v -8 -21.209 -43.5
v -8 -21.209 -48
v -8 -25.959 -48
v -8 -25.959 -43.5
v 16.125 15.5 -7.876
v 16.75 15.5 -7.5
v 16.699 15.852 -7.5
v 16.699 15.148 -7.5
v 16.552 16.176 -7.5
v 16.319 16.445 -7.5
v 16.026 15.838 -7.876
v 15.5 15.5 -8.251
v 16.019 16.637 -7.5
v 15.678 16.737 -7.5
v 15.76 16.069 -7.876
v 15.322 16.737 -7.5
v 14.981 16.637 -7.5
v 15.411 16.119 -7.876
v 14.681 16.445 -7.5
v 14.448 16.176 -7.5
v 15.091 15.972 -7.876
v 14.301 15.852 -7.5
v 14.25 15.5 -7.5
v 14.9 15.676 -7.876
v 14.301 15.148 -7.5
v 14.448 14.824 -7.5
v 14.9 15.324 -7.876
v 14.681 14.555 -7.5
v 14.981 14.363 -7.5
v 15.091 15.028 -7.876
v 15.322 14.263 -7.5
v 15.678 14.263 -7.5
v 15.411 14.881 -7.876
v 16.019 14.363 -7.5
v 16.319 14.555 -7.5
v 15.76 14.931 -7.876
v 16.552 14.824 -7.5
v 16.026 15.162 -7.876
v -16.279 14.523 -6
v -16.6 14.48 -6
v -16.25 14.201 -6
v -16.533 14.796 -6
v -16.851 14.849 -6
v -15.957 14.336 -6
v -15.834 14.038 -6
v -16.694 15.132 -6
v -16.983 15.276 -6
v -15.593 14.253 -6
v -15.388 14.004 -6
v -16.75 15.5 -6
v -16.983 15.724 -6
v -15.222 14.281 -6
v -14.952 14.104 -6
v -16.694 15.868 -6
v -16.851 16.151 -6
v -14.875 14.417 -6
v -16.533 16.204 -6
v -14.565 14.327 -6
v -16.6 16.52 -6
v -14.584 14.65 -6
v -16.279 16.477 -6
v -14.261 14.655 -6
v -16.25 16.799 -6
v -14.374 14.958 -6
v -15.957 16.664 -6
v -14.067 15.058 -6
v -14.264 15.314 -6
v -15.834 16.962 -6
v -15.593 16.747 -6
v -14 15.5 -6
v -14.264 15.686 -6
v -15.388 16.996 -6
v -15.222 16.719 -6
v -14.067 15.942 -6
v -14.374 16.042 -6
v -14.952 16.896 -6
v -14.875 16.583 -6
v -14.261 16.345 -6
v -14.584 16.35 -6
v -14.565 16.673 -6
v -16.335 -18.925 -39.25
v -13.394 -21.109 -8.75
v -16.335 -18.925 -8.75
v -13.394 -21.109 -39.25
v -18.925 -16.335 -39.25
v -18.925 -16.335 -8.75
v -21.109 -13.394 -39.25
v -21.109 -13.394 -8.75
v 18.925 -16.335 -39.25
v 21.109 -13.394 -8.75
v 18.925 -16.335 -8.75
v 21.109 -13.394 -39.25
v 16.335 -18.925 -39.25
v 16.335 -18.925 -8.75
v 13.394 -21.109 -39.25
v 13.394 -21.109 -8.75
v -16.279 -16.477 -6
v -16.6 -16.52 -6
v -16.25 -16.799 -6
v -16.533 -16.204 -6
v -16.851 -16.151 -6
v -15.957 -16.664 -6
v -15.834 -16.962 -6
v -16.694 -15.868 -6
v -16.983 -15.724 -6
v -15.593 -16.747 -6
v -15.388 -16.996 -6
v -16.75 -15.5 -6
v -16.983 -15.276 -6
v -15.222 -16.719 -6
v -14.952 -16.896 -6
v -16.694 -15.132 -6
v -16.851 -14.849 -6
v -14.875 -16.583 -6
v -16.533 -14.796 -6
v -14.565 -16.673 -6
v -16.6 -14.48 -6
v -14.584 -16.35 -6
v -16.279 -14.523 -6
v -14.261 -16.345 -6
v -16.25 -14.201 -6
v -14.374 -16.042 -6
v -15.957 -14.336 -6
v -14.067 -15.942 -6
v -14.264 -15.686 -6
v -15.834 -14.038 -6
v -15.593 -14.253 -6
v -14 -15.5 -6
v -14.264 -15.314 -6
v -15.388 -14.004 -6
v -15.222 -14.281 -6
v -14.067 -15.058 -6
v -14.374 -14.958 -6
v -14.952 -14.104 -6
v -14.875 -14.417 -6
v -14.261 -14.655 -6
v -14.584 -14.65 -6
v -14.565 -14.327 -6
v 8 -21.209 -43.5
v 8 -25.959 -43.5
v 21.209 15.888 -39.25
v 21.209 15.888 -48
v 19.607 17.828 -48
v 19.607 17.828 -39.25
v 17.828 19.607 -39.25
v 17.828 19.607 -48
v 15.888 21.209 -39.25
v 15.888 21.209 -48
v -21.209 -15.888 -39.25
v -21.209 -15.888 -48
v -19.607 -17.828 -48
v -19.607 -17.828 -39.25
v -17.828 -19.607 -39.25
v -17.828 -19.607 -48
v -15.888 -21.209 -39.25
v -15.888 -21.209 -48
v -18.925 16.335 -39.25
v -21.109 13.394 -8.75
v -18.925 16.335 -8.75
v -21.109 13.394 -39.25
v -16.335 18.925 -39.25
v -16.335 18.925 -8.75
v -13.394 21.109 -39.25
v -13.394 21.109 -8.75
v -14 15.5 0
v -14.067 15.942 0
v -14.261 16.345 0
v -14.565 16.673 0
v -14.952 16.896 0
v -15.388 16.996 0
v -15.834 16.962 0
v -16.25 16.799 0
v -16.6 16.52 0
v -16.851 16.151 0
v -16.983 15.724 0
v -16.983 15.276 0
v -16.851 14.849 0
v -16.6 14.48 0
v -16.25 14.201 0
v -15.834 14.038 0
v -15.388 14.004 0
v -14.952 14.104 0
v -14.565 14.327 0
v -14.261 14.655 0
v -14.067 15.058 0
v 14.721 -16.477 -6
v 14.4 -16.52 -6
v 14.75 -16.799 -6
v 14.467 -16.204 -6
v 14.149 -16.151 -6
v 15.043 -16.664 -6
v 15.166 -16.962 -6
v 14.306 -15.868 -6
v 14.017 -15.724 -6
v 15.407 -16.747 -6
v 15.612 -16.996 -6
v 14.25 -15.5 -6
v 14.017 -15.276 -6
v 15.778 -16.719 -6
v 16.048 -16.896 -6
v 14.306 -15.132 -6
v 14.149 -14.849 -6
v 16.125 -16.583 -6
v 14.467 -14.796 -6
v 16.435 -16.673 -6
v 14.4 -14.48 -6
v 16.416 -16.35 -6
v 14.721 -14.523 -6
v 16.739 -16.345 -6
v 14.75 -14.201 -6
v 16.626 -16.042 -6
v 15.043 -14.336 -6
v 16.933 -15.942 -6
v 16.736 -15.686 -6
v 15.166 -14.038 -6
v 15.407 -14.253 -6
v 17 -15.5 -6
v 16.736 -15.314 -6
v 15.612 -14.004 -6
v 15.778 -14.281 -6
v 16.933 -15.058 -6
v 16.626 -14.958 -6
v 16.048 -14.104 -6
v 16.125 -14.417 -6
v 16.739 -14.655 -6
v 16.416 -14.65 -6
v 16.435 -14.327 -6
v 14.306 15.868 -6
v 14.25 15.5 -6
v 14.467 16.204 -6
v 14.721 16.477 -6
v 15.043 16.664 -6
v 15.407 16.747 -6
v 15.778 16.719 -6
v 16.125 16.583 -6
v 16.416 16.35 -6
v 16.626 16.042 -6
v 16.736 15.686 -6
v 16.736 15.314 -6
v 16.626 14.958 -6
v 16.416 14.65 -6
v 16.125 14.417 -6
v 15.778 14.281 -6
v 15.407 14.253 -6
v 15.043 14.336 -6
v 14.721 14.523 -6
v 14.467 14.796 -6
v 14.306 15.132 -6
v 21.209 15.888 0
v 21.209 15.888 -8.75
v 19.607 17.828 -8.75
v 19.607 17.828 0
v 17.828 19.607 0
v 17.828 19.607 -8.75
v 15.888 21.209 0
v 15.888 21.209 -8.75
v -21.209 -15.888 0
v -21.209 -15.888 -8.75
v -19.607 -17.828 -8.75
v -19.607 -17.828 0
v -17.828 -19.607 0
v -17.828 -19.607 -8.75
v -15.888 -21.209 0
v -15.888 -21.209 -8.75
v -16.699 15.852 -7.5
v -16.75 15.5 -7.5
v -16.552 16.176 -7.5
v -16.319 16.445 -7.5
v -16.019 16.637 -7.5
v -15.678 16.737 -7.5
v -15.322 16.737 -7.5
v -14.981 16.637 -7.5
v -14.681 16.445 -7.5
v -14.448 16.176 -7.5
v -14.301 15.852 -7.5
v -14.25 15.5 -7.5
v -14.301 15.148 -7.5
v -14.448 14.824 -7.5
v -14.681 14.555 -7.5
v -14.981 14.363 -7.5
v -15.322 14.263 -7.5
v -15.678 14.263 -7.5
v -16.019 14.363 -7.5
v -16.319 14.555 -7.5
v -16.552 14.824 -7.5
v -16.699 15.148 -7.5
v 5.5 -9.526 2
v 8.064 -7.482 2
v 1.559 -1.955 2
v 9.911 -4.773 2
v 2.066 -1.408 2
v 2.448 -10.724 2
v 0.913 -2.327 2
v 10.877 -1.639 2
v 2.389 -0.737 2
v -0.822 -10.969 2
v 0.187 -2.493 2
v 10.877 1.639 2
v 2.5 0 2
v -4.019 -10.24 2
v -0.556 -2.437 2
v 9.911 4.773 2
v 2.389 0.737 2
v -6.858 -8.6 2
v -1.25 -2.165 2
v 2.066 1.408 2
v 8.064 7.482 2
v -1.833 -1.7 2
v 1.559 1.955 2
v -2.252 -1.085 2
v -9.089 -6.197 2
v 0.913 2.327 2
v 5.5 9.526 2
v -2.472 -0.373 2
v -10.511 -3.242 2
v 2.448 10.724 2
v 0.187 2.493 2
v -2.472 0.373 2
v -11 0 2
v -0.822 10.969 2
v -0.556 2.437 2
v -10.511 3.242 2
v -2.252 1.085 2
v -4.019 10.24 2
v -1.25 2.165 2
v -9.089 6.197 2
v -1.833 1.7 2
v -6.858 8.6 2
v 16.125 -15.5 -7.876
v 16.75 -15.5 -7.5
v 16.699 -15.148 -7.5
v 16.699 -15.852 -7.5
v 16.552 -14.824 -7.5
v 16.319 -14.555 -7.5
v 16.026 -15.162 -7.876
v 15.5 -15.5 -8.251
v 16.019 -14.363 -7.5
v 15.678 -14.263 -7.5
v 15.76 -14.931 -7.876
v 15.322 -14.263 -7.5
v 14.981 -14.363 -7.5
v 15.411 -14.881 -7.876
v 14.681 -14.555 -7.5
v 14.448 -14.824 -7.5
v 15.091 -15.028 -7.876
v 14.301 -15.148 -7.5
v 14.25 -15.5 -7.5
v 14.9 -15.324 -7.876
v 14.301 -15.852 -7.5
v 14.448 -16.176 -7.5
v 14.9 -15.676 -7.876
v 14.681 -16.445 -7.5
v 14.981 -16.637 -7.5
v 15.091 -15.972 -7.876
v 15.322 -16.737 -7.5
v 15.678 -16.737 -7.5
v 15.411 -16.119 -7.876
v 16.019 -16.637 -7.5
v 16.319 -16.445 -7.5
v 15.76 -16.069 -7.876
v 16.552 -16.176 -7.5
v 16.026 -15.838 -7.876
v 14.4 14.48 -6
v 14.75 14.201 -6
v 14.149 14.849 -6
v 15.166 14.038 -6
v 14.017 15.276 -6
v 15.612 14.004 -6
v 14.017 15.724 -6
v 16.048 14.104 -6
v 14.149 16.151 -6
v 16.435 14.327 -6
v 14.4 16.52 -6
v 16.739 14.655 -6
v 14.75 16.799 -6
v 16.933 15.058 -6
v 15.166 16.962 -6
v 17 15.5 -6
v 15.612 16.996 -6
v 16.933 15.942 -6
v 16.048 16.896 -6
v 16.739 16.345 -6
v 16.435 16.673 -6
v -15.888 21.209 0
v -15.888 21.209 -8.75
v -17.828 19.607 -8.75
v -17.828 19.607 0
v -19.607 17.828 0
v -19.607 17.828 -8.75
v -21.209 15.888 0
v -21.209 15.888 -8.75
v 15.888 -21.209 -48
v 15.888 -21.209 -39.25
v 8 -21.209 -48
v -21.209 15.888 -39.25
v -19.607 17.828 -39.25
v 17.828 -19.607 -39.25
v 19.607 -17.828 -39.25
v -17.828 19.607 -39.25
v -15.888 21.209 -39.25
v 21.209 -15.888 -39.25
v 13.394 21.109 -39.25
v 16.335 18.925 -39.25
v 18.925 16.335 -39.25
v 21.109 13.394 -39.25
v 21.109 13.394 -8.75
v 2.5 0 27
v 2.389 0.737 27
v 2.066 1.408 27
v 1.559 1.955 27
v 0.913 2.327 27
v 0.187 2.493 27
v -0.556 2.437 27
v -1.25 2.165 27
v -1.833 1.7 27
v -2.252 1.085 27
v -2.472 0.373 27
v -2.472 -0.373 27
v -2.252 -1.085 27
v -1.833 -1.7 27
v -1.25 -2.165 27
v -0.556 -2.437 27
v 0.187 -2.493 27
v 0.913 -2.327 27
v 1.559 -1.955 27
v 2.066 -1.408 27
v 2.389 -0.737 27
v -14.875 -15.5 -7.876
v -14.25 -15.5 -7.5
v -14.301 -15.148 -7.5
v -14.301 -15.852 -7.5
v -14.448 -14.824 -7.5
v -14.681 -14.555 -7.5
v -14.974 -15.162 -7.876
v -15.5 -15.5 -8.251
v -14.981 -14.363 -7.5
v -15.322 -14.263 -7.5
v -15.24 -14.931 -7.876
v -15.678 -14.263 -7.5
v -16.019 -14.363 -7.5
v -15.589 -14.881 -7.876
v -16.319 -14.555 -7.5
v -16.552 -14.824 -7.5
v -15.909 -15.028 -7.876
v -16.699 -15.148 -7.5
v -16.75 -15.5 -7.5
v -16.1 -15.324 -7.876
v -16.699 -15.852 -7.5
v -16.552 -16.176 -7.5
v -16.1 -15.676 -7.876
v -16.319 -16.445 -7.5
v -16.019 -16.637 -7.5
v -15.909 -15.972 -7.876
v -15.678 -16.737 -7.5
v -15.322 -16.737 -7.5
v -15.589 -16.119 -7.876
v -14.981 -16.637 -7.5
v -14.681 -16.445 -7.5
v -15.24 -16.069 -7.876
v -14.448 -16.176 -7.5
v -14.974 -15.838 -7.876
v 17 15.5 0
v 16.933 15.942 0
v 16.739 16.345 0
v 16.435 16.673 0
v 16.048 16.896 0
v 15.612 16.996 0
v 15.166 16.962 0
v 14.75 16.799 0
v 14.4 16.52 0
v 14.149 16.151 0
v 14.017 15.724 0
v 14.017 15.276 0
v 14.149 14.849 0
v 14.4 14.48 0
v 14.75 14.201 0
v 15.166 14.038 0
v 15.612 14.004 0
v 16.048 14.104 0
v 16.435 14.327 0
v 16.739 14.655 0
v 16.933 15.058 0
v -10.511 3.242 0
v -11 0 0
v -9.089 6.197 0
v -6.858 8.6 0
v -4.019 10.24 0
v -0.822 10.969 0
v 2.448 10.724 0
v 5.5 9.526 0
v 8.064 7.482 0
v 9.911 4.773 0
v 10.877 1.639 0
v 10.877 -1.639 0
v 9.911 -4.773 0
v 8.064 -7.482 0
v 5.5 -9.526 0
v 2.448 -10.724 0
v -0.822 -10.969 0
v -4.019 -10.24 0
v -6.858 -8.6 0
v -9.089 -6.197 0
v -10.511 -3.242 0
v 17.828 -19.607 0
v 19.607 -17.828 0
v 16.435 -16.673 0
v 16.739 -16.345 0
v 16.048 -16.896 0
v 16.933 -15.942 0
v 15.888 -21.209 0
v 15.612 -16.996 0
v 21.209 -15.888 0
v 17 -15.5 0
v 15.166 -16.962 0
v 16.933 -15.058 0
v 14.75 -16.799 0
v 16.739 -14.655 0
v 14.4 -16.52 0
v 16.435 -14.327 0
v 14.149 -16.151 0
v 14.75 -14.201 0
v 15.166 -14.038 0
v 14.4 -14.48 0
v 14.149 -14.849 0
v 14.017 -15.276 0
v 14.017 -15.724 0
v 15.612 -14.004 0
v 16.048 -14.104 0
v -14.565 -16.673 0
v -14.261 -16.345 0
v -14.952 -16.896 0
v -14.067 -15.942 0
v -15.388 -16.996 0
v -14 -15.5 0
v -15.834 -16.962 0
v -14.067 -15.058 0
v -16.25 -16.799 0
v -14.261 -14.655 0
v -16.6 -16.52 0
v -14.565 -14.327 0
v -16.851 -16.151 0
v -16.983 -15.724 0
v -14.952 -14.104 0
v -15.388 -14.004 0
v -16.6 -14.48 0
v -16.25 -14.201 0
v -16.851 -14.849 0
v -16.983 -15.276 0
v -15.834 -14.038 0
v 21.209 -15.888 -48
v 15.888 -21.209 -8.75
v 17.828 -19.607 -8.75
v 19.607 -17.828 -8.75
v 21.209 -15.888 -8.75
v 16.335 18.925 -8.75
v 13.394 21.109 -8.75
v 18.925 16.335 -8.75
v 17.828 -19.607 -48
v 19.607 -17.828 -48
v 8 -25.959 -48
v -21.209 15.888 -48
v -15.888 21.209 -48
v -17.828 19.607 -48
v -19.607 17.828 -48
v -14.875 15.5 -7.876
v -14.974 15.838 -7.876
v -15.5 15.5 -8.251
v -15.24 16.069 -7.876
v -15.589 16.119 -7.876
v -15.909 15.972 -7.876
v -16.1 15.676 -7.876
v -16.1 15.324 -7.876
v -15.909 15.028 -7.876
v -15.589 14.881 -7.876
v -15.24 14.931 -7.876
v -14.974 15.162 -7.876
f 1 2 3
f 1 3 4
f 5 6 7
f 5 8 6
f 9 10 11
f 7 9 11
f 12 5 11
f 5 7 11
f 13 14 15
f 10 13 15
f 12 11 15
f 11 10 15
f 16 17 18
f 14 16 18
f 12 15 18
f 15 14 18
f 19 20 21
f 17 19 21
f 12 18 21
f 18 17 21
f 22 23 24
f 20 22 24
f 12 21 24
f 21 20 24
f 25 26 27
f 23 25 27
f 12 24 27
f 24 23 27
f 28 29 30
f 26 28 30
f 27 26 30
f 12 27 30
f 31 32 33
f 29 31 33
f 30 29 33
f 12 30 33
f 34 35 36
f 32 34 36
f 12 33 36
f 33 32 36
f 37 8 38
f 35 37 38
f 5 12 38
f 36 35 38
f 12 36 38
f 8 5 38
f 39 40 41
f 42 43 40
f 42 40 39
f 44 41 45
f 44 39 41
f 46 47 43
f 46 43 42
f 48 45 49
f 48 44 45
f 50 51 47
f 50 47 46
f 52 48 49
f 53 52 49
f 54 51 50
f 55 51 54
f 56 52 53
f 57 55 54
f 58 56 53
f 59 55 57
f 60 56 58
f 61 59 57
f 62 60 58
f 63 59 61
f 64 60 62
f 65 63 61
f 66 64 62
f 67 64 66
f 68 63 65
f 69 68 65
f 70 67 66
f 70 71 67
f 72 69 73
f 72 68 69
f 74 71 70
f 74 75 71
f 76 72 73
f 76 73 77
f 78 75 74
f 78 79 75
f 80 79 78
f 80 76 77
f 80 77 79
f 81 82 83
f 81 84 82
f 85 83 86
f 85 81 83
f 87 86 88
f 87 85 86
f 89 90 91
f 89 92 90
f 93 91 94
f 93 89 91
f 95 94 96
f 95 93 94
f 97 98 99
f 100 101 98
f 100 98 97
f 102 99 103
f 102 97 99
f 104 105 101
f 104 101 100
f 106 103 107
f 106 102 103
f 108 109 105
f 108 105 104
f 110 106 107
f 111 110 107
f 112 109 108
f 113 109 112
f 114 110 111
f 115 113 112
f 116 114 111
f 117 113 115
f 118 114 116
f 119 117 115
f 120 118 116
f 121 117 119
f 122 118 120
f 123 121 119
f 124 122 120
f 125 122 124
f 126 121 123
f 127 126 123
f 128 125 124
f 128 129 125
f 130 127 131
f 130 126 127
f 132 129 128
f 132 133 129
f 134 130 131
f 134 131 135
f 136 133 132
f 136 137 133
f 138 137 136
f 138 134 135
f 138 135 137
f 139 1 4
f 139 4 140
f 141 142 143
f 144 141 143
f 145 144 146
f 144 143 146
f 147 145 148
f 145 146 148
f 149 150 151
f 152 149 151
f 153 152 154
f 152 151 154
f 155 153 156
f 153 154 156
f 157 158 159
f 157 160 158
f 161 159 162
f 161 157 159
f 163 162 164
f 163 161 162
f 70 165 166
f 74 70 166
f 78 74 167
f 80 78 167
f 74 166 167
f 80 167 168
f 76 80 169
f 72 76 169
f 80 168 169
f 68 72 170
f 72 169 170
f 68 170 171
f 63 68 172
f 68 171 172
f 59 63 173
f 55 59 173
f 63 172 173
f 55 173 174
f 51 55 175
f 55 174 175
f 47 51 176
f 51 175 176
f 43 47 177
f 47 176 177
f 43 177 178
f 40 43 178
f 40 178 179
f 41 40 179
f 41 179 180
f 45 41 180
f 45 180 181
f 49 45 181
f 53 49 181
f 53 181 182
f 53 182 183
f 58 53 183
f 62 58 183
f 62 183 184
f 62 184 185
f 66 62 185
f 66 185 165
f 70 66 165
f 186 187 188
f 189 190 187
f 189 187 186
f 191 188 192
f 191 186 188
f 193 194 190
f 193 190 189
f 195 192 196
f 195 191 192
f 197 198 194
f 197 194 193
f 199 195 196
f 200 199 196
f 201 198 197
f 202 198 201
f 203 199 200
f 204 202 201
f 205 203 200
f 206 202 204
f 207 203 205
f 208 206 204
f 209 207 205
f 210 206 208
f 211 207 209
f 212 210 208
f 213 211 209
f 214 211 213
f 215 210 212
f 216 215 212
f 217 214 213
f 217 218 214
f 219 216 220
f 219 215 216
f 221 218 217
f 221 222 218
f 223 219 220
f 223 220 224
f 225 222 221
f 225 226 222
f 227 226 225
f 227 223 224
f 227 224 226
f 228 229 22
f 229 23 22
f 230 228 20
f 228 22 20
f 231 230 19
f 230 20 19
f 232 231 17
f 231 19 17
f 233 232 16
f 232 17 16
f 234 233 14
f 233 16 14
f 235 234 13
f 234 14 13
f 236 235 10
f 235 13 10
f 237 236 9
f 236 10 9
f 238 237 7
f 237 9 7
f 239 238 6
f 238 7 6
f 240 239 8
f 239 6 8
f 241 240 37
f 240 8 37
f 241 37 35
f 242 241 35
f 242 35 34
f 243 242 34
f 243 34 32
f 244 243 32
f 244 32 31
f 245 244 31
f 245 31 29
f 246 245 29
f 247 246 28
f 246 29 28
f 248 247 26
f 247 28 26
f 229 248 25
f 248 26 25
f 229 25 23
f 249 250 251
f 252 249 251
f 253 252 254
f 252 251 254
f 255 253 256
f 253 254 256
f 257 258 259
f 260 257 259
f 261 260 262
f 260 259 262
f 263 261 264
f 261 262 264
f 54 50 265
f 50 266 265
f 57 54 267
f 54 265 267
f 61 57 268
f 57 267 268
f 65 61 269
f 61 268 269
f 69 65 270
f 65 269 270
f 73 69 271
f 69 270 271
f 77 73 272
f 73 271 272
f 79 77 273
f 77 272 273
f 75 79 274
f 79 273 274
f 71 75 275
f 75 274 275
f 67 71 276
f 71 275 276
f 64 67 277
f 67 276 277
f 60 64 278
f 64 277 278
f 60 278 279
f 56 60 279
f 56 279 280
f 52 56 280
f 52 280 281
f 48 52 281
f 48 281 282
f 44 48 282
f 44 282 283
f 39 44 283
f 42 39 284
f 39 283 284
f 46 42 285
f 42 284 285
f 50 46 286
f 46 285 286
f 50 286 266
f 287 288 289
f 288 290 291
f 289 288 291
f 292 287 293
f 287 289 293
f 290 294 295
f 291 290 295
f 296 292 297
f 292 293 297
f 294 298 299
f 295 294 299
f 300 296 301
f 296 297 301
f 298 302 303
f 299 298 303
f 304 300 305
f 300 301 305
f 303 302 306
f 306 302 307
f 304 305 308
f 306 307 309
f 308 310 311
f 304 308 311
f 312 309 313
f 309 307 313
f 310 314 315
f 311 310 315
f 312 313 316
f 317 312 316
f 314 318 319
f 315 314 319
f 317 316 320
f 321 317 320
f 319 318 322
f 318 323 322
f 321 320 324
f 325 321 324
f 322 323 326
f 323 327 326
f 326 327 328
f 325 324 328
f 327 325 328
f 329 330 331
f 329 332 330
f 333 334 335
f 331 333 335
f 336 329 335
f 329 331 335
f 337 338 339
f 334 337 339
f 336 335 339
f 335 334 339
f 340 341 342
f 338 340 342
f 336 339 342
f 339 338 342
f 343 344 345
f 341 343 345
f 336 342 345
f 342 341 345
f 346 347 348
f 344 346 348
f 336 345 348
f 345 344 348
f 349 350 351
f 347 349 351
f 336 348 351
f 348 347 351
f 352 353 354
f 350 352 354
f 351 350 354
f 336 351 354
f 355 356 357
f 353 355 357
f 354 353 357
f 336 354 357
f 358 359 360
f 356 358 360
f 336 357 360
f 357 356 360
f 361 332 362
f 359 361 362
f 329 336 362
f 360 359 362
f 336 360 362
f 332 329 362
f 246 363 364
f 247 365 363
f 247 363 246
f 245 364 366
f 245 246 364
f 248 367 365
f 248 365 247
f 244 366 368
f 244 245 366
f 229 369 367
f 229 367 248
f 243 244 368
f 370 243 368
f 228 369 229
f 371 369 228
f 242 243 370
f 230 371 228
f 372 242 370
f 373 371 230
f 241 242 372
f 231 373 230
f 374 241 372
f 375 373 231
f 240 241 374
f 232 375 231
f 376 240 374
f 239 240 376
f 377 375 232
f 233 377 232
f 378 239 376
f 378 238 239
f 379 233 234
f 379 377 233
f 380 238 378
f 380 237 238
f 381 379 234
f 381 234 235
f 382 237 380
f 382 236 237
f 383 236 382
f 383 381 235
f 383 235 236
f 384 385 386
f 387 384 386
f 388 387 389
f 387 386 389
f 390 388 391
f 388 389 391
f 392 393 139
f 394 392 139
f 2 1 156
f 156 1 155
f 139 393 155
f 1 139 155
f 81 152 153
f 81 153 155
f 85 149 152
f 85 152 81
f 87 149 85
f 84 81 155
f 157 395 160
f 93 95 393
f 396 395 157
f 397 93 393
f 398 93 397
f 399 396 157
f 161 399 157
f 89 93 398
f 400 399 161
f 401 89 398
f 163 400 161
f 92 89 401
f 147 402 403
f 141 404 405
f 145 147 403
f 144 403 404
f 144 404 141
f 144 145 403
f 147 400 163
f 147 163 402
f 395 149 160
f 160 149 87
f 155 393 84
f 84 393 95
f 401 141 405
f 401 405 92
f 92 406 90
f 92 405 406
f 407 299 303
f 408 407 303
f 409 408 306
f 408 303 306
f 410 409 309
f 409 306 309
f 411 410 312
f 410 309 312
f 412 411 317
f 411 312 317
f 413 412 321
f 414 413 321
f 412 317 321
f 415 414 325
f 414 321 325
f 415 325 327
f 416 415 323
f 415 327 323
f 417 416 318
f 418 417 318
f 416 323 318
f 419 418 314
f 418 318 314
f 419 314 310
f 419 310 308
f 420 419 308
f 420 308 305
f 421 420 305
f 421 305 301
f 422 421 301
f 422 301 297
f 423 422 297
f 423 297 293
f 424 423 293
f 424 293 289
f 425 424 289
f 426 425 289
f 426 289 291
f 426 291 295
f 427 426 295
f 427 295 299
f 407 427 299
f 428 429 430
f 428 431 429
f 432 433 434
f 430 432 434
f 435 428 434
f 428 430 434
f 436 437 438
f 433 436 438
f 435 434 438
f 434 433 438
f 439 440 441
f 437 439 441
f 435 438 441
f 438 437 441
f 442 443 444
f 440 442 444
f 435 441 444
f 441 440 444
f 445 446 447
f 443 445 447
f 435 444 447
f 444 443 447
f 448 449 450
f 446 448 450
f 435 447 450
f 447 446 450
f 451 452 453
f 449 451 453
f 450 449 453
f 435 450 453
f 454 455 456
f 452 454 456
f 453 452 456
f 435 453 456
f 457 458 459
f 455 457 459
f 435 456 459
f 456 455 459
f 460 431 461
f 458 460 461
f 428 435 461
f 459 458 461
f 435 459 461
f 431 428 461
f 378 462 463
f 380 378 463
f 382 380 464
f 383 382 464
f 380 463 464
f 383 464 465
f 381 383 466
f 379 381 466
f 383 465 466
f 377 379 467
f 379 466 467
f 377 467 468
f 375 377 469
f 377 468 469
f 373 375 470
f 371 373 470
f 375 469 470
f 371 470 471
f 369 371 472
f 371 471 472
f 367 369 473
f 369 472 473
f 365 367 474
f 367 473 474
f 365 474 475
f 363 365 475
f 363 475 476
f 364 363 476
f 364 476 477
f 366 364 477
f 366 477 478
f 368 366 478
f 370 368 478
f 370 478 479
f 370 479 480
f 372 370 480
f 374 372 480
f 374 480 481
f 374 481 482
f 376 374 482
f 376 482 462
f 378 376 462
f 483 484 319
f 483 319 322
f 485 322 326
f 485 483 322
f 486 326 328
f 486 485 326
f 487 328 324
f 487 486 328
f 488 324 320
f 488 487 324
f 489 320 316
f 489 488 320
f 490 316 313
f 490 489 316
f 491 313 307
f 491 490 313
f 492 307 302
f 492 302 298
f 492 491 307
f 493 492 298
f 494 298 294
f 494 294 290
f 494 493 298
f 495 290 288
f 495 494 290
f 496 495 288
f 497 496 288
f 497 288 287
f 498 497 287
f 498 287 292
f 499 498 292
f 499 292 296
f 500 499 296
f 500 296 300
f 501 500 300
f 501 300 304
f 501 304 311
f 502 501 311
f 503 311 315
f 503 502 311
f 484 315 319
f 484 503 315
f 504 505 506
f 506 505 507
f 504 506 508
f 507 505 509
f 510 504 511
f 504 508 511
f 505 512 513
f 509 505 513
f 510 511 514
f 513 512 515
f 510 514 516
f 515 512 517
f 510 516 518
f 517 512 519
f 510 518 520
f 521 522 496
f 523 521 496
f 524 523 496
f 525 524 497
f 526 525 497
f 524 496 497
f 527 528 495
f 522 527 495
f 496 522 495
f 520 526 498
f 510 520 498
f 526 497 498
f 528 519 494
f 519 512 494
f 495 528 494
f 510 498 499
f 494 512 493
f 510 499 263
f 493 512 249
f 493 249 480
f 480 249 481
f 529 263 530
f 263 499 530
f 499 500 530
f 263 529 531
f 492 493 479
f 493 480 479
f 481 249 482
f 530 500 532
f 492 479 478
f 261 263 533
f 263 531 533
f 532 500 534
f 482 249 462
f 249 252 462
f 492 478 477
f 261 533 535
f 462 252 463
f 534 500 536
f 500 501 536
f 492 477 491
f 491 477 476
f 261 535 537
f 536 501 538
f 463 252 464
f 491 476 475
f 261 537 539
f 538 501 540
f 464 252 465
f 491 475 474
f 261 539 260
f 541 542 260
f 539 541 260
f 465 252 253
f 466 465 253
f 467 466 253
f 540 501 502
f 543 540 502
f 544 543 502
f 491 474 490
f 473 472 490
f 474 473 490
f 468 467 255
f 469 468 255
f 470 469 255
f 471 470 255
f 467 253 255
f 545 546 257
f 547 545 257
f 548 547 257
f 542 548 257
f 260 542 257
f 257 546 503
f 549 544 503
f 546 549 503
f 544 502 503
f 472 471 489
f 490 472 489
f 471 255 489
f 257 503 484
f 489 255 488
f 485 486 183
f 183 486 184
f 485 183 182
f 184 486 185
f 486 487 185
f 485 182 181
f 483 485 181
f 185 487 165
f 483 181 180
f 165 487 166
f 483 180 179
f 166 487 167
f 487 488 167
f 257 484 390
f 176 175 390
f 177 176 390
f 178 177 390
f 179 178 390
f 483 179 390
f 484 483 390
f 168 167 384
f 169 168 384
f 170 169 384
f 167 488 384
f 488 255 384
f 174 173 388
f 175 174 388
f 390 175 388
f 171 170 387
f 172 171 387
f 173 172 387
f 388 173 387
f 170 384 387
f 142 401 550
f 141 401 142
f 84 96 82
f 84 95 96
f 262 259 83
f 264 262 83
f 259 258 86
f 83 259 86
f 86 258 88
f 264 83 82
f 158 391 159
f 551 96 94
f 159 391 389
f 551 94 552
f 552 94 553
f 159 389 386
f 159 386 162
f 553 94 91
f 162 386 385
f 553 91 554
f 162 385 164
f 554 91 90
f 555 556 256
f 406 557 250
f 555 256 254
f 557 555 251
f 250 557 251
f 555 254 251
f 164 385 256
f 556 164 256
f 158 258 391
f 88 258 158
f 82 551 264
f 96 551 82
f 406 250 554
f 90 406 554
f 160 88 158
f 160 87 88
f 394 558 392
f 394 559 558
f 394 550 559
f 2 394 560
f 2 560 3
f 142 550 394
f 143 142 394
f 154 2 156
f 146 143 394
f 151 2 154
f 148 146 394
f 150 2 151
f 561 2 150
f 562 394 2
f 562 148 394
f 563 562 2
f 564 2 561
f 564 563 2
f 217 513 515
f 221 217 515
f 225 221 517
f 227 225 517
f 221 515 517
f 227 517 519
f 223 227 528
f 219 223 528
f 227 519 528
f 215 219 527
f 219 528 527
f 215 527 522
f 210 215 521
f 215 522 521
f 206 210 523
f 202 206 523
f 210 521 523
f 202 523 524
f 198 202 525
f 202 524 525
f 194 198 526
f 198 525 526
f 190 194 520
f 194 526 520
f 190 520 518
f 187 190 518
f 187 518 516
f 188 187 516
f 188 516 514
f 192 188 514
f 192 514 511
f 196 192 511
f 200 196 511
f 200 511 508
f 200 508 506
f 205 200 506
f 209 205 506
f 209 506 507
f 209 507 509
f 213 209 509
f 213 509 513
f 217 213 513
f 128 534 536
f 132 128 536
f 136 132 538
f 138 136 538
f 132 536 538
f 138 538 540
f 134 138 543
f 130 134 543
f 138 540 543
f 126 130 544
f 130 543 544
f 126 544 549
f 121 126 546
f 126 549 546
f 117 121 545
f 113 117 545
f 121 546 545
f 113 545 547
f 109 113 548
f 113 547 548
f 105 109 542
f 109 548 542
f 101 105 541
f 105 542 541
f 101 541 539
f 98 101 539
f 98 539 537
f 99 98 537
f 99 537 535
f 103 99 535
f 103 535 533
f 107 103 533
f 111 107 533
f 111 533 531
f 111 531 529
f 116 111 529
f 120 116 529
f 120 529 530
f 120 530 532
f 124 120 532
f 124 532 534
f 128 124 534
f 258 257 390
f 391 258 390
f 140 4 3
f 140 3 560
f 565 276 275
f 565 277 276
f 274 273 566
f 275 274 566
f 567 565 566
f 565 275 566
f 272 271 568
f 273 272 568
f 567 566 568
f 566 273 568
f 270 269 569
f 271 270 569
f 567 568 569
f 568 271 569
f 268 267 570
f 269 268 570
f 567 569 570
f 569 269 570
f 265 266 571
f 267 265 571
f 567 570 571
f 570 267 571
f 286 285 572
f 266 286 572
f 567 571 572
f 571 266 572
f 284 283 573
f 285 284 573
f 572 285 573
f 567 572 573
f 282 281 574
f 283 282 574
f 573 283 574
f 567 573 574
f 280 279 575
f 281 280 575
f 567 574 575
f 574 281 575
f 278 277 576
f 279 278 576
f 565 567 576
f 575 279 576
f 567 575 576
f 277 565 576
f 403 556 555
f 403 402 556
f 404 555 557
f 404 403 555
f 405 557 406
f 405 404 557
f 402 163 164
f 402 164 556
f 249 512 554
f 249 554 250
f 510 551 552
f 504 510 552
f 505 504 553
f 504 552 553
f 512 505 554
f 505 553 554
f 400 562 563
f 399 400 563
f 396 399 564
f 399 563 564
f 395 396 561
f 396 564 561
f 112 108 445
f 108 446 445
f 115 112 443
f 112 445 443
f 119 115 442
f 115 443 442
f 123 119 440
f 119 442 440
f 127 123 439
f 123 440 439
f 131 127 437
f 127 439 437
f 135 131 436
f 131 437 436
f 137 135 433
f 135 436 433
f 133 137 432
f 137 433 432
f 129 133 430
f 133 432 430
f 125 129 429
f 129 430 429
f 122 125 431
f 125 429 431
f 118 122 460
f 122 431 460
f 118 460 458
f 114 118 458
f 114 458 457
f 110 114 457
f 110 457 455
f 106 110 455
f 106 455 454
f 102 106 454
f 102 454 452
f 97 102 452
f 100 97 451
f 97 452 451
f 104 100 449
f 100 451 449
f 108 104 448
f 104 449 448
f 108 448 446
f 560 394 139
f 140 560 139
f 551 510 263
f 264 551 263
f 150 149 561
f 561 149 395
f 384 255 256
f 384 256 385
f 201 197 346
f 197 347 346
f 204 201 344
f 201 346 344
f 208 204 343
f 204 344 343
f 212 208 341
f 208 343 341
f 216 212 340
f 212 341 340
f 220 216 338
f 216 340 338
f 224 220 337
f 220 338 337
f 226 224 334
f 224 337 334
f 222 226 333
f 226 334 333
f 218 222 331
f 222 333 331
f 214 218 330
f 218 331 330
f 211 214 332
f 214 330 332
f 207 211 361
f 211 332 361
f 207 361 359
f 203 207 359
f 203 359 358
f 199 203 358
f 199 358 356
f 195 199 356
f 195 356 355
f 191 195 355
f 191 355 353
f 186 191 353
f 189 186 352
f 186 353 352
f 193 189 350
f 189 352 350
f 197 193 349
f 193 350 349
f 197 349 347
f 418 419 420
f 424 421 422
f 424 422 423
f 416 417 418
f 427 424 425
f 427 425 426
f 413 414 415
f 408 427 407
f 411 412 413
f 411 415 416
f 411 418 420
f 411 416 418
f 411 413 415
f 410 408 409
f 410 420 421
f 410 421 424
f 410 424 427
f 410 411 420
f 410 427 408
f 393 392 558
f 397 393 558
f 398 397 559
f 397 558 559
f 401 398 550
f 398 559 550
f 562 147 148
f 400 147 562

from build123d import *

# Parameters (mm, degrees)
SKETCH1_R                       = 2.5
BOSS_EXTRUDE1_DEPTH             = 27
SKETCH2_R                       = 11
BOSS_EXTRUDE2_DEPTH             = 2
SKETCH3_W                       = 42.418
SKETCH3_H                       = 42.418
BOSS_EXTRUDE3_DEPTH             = 48
CUT_EXTRUDE1_DEPTH              = 76
M3X0_5_TAPPED_HOLE1_D           = 2.5
M3X0_5_TAPPED_HOLE1_DEPTH       = 7.5
M3X0_5_TAPPED_HOLE1_CBORE_D     = 3
M3X0_5_TAPPED_HOLE1_CBORE_DEPTH = 6
M3X0_5_TAPPED_HOLE1_TIP         = 0.751075774
CUT_EXTRUDE3_DEPTH              = 15.25
CUT_EXTRUDE3_DEPTH_BACK         = 15.25
SKETCH9_W                       = 16
SKETCH9_H                       = 4.5
BOSS_EXTRUDE4_DEPTH             = 4.75


with BuildPart() as part:
    # Sketch1 → Boss-Extrude1 (new body)
    with BuildSketch(Plane.XY):
        Circle(SKETCH1_R)
    extrude(amount=BOSS_EXTRUDE1_DEPTH)

    # Sketch2 → Boss-Extrude2 (add)
    with BuildSketch(Plane(origin=(0, 0, 0), x_dir=(-1, 0, 0), z_dir=(0, 0, -1))):
        Circle(SKETCH2_R)
    extrude(amount=-BOSS_EXTRUDE2_DEPTH)

    # Sketch3 → Boss-Extrude3 (add)
    with BuildSketch(Plane(origin=(0, 0, 0), x_dir=(-1, 0, 0), z_dir=(0, 0, -1))):
        Rectangle(SKETCH3_W, SKETCH3_H)
    extrude(amount=BOSS_EXTRUDE3_DEPTH)

    # Sketch4 → Cut-Extrude1 (cut, through all)
    with BuildSketch(Plane(origin=(0, 0, -48), x_dir=(-1, 0, 0), z_dir=(0, 0, -1))):
        with BuildLine():
            Line((-21.209, -15.887992919), (-21.209, -21.209))
            Line((-21.209, -21.209), (-15.887992919, -21.209))
            ThreePointArc((-15.887992919, -21.209), (-18.738329701, -18.738329701), (-21.209, -15.887992919))
        make_face()
        with BuildLine():
            Line((15.887992919, -21.209), (21.209, -21.209))
            Line((21.209, -21.209), (21.209, -15.887992919))
            ThreePointArc((21.209, -15.887992919), (18.738329701, -18.738329701), (15.887992919, -21.209))
        make_face()
        with BuildLine():
            Line((21.209, 15.887992919), (21.209, 21.209))
            Line((21.209, 21.209), (15.887992919, 21.209))
            ThreePointArc((15.887992919, 21.209), (18.738329701, 18.738329701), (21.209, 15.887992919))
        make_face()
        with BuildLine():
            Line((-15.887992919, 21.209), (-21.209, 21.209))
            Line((-21.209, 21.209), (-21.209, 15.887992919))
            ThreePointArc((-21.209, 15.887992919), (-18.738329701, 18.738329701), (-15.887992919, 21.209))
        make_face()
    extrude(amount=-CUT_EXTRUDE1_DEPTH, mode=Mode.SUBTRACT)

    # M3x0.5 Tapped Hole1
    with Locations(Plane.XY):
        with Locations((-15.5, 15.5), (-15.5, -15.5), (15.5, -15.5), (15.5, 15.5)):
            CounterBoreHole(M3X0_5_TAPPED_HOLE1_D / 2, M3X0_5_TAPPED_HOLE1_CBORE_D / 2, M3X0_5_TAPPED_HOLE1_CBORE_DEPTH, depth=M3X0_5_TAPPED_HOLE1_DEPTH)
            with Locations((0, 0, -(M3X0_5_TAPPED_HOLE1_DEPTH + M3X0_5_TAPPED_HOLE1_TIP / 2))):  # 118° drill point
                Cone(0, M3X0_5_TAPPED_HOLE1_D / 2, M3X0_5_TAPPED_HOLE1_TIP, mode=Mode.SUBTRACT)

    # Sketch8 → Cut-Extrude3 (cut, two sides)
    with BuildSketch(Plane.XY.offset(-24)) as cut_extrude3_sk:
        with BuildLine():
            Line((15.887992919, 21.209), (-15.887992919, 21.209))
            ThreePointArc((-15.887992919, 21.209), (-18.738329701, 18.738329701), (-21.209, 15.887992919))
            Line((-21.209, 15.887992919), (-21.209, -15.887992919))
            ThreePointArc((-21.209, -15.887992919), (-18.738329701, -18.738329701), (-15.887992919, -21.209))
            Line((-15.887992919, -21.209), (15.887992919, -21.209))
            ThreePointArc((15.887992919, -21.209), (18.738329701, -18.738329701), (21.209, -15.887992919))
            Line((21.209, -15.887992919), (21.209, 15.887992919))
            ThreePointArc((21.209, 15.887992919), (18.738329701, 18.738329701), (15.887992919, 21.209))
        make_face()
        with BuildLine():
            Line((-13.394406258, 21.109), (13.394406258, 21.109))
            ThreePointArc((13.394406258, 21.109), (17.67766953, 17.67766953), (21.109, 13.394406258))
            Line((21.109, 13.394406258), (21.109, -13.394406258))
            ThreePointArc((21.109, -13.394406258), (17.67766953, -17.67766953), (13.394406258, -21.109))
            Line((13.394406258, -21.109), (-13.394406258, -21.109))
            ThreePointArc((-13.394406258, -21.109), (-17.67766953, -17.67766953), (-21.109, -13.394406258))
            Line((-21.109, -13.394406258), (-21.109, 13.394406258))
            ThreePointArc((-21.109, 13.394406258), (-17.67766953, 17.67766953), (-13.394406258, 21.109))
        make_face(mode=Mode.SUBTRACT)
    extrude(amount=CUT_EXTRUDE3_DEPTH, mode=Mode.SUBTRACT)
    extrude(cut_extrude3_sk.sketch, amount=-CUT_EXTRUDE3_DEPTH_BACK, mode=Mode.SUBTRACT)

    # Sketch9 → Boss-Extrude4 (add)
    with BuildSketch(Plane.XZ.offset(21.209)):
        with Locations((0, -45.75)):
            Rectangle(SKETCH9_W, SKETCH9_H)
    extrude(amount=BOSS_EXTRUDE4_DEPTH)


solid = part.part
